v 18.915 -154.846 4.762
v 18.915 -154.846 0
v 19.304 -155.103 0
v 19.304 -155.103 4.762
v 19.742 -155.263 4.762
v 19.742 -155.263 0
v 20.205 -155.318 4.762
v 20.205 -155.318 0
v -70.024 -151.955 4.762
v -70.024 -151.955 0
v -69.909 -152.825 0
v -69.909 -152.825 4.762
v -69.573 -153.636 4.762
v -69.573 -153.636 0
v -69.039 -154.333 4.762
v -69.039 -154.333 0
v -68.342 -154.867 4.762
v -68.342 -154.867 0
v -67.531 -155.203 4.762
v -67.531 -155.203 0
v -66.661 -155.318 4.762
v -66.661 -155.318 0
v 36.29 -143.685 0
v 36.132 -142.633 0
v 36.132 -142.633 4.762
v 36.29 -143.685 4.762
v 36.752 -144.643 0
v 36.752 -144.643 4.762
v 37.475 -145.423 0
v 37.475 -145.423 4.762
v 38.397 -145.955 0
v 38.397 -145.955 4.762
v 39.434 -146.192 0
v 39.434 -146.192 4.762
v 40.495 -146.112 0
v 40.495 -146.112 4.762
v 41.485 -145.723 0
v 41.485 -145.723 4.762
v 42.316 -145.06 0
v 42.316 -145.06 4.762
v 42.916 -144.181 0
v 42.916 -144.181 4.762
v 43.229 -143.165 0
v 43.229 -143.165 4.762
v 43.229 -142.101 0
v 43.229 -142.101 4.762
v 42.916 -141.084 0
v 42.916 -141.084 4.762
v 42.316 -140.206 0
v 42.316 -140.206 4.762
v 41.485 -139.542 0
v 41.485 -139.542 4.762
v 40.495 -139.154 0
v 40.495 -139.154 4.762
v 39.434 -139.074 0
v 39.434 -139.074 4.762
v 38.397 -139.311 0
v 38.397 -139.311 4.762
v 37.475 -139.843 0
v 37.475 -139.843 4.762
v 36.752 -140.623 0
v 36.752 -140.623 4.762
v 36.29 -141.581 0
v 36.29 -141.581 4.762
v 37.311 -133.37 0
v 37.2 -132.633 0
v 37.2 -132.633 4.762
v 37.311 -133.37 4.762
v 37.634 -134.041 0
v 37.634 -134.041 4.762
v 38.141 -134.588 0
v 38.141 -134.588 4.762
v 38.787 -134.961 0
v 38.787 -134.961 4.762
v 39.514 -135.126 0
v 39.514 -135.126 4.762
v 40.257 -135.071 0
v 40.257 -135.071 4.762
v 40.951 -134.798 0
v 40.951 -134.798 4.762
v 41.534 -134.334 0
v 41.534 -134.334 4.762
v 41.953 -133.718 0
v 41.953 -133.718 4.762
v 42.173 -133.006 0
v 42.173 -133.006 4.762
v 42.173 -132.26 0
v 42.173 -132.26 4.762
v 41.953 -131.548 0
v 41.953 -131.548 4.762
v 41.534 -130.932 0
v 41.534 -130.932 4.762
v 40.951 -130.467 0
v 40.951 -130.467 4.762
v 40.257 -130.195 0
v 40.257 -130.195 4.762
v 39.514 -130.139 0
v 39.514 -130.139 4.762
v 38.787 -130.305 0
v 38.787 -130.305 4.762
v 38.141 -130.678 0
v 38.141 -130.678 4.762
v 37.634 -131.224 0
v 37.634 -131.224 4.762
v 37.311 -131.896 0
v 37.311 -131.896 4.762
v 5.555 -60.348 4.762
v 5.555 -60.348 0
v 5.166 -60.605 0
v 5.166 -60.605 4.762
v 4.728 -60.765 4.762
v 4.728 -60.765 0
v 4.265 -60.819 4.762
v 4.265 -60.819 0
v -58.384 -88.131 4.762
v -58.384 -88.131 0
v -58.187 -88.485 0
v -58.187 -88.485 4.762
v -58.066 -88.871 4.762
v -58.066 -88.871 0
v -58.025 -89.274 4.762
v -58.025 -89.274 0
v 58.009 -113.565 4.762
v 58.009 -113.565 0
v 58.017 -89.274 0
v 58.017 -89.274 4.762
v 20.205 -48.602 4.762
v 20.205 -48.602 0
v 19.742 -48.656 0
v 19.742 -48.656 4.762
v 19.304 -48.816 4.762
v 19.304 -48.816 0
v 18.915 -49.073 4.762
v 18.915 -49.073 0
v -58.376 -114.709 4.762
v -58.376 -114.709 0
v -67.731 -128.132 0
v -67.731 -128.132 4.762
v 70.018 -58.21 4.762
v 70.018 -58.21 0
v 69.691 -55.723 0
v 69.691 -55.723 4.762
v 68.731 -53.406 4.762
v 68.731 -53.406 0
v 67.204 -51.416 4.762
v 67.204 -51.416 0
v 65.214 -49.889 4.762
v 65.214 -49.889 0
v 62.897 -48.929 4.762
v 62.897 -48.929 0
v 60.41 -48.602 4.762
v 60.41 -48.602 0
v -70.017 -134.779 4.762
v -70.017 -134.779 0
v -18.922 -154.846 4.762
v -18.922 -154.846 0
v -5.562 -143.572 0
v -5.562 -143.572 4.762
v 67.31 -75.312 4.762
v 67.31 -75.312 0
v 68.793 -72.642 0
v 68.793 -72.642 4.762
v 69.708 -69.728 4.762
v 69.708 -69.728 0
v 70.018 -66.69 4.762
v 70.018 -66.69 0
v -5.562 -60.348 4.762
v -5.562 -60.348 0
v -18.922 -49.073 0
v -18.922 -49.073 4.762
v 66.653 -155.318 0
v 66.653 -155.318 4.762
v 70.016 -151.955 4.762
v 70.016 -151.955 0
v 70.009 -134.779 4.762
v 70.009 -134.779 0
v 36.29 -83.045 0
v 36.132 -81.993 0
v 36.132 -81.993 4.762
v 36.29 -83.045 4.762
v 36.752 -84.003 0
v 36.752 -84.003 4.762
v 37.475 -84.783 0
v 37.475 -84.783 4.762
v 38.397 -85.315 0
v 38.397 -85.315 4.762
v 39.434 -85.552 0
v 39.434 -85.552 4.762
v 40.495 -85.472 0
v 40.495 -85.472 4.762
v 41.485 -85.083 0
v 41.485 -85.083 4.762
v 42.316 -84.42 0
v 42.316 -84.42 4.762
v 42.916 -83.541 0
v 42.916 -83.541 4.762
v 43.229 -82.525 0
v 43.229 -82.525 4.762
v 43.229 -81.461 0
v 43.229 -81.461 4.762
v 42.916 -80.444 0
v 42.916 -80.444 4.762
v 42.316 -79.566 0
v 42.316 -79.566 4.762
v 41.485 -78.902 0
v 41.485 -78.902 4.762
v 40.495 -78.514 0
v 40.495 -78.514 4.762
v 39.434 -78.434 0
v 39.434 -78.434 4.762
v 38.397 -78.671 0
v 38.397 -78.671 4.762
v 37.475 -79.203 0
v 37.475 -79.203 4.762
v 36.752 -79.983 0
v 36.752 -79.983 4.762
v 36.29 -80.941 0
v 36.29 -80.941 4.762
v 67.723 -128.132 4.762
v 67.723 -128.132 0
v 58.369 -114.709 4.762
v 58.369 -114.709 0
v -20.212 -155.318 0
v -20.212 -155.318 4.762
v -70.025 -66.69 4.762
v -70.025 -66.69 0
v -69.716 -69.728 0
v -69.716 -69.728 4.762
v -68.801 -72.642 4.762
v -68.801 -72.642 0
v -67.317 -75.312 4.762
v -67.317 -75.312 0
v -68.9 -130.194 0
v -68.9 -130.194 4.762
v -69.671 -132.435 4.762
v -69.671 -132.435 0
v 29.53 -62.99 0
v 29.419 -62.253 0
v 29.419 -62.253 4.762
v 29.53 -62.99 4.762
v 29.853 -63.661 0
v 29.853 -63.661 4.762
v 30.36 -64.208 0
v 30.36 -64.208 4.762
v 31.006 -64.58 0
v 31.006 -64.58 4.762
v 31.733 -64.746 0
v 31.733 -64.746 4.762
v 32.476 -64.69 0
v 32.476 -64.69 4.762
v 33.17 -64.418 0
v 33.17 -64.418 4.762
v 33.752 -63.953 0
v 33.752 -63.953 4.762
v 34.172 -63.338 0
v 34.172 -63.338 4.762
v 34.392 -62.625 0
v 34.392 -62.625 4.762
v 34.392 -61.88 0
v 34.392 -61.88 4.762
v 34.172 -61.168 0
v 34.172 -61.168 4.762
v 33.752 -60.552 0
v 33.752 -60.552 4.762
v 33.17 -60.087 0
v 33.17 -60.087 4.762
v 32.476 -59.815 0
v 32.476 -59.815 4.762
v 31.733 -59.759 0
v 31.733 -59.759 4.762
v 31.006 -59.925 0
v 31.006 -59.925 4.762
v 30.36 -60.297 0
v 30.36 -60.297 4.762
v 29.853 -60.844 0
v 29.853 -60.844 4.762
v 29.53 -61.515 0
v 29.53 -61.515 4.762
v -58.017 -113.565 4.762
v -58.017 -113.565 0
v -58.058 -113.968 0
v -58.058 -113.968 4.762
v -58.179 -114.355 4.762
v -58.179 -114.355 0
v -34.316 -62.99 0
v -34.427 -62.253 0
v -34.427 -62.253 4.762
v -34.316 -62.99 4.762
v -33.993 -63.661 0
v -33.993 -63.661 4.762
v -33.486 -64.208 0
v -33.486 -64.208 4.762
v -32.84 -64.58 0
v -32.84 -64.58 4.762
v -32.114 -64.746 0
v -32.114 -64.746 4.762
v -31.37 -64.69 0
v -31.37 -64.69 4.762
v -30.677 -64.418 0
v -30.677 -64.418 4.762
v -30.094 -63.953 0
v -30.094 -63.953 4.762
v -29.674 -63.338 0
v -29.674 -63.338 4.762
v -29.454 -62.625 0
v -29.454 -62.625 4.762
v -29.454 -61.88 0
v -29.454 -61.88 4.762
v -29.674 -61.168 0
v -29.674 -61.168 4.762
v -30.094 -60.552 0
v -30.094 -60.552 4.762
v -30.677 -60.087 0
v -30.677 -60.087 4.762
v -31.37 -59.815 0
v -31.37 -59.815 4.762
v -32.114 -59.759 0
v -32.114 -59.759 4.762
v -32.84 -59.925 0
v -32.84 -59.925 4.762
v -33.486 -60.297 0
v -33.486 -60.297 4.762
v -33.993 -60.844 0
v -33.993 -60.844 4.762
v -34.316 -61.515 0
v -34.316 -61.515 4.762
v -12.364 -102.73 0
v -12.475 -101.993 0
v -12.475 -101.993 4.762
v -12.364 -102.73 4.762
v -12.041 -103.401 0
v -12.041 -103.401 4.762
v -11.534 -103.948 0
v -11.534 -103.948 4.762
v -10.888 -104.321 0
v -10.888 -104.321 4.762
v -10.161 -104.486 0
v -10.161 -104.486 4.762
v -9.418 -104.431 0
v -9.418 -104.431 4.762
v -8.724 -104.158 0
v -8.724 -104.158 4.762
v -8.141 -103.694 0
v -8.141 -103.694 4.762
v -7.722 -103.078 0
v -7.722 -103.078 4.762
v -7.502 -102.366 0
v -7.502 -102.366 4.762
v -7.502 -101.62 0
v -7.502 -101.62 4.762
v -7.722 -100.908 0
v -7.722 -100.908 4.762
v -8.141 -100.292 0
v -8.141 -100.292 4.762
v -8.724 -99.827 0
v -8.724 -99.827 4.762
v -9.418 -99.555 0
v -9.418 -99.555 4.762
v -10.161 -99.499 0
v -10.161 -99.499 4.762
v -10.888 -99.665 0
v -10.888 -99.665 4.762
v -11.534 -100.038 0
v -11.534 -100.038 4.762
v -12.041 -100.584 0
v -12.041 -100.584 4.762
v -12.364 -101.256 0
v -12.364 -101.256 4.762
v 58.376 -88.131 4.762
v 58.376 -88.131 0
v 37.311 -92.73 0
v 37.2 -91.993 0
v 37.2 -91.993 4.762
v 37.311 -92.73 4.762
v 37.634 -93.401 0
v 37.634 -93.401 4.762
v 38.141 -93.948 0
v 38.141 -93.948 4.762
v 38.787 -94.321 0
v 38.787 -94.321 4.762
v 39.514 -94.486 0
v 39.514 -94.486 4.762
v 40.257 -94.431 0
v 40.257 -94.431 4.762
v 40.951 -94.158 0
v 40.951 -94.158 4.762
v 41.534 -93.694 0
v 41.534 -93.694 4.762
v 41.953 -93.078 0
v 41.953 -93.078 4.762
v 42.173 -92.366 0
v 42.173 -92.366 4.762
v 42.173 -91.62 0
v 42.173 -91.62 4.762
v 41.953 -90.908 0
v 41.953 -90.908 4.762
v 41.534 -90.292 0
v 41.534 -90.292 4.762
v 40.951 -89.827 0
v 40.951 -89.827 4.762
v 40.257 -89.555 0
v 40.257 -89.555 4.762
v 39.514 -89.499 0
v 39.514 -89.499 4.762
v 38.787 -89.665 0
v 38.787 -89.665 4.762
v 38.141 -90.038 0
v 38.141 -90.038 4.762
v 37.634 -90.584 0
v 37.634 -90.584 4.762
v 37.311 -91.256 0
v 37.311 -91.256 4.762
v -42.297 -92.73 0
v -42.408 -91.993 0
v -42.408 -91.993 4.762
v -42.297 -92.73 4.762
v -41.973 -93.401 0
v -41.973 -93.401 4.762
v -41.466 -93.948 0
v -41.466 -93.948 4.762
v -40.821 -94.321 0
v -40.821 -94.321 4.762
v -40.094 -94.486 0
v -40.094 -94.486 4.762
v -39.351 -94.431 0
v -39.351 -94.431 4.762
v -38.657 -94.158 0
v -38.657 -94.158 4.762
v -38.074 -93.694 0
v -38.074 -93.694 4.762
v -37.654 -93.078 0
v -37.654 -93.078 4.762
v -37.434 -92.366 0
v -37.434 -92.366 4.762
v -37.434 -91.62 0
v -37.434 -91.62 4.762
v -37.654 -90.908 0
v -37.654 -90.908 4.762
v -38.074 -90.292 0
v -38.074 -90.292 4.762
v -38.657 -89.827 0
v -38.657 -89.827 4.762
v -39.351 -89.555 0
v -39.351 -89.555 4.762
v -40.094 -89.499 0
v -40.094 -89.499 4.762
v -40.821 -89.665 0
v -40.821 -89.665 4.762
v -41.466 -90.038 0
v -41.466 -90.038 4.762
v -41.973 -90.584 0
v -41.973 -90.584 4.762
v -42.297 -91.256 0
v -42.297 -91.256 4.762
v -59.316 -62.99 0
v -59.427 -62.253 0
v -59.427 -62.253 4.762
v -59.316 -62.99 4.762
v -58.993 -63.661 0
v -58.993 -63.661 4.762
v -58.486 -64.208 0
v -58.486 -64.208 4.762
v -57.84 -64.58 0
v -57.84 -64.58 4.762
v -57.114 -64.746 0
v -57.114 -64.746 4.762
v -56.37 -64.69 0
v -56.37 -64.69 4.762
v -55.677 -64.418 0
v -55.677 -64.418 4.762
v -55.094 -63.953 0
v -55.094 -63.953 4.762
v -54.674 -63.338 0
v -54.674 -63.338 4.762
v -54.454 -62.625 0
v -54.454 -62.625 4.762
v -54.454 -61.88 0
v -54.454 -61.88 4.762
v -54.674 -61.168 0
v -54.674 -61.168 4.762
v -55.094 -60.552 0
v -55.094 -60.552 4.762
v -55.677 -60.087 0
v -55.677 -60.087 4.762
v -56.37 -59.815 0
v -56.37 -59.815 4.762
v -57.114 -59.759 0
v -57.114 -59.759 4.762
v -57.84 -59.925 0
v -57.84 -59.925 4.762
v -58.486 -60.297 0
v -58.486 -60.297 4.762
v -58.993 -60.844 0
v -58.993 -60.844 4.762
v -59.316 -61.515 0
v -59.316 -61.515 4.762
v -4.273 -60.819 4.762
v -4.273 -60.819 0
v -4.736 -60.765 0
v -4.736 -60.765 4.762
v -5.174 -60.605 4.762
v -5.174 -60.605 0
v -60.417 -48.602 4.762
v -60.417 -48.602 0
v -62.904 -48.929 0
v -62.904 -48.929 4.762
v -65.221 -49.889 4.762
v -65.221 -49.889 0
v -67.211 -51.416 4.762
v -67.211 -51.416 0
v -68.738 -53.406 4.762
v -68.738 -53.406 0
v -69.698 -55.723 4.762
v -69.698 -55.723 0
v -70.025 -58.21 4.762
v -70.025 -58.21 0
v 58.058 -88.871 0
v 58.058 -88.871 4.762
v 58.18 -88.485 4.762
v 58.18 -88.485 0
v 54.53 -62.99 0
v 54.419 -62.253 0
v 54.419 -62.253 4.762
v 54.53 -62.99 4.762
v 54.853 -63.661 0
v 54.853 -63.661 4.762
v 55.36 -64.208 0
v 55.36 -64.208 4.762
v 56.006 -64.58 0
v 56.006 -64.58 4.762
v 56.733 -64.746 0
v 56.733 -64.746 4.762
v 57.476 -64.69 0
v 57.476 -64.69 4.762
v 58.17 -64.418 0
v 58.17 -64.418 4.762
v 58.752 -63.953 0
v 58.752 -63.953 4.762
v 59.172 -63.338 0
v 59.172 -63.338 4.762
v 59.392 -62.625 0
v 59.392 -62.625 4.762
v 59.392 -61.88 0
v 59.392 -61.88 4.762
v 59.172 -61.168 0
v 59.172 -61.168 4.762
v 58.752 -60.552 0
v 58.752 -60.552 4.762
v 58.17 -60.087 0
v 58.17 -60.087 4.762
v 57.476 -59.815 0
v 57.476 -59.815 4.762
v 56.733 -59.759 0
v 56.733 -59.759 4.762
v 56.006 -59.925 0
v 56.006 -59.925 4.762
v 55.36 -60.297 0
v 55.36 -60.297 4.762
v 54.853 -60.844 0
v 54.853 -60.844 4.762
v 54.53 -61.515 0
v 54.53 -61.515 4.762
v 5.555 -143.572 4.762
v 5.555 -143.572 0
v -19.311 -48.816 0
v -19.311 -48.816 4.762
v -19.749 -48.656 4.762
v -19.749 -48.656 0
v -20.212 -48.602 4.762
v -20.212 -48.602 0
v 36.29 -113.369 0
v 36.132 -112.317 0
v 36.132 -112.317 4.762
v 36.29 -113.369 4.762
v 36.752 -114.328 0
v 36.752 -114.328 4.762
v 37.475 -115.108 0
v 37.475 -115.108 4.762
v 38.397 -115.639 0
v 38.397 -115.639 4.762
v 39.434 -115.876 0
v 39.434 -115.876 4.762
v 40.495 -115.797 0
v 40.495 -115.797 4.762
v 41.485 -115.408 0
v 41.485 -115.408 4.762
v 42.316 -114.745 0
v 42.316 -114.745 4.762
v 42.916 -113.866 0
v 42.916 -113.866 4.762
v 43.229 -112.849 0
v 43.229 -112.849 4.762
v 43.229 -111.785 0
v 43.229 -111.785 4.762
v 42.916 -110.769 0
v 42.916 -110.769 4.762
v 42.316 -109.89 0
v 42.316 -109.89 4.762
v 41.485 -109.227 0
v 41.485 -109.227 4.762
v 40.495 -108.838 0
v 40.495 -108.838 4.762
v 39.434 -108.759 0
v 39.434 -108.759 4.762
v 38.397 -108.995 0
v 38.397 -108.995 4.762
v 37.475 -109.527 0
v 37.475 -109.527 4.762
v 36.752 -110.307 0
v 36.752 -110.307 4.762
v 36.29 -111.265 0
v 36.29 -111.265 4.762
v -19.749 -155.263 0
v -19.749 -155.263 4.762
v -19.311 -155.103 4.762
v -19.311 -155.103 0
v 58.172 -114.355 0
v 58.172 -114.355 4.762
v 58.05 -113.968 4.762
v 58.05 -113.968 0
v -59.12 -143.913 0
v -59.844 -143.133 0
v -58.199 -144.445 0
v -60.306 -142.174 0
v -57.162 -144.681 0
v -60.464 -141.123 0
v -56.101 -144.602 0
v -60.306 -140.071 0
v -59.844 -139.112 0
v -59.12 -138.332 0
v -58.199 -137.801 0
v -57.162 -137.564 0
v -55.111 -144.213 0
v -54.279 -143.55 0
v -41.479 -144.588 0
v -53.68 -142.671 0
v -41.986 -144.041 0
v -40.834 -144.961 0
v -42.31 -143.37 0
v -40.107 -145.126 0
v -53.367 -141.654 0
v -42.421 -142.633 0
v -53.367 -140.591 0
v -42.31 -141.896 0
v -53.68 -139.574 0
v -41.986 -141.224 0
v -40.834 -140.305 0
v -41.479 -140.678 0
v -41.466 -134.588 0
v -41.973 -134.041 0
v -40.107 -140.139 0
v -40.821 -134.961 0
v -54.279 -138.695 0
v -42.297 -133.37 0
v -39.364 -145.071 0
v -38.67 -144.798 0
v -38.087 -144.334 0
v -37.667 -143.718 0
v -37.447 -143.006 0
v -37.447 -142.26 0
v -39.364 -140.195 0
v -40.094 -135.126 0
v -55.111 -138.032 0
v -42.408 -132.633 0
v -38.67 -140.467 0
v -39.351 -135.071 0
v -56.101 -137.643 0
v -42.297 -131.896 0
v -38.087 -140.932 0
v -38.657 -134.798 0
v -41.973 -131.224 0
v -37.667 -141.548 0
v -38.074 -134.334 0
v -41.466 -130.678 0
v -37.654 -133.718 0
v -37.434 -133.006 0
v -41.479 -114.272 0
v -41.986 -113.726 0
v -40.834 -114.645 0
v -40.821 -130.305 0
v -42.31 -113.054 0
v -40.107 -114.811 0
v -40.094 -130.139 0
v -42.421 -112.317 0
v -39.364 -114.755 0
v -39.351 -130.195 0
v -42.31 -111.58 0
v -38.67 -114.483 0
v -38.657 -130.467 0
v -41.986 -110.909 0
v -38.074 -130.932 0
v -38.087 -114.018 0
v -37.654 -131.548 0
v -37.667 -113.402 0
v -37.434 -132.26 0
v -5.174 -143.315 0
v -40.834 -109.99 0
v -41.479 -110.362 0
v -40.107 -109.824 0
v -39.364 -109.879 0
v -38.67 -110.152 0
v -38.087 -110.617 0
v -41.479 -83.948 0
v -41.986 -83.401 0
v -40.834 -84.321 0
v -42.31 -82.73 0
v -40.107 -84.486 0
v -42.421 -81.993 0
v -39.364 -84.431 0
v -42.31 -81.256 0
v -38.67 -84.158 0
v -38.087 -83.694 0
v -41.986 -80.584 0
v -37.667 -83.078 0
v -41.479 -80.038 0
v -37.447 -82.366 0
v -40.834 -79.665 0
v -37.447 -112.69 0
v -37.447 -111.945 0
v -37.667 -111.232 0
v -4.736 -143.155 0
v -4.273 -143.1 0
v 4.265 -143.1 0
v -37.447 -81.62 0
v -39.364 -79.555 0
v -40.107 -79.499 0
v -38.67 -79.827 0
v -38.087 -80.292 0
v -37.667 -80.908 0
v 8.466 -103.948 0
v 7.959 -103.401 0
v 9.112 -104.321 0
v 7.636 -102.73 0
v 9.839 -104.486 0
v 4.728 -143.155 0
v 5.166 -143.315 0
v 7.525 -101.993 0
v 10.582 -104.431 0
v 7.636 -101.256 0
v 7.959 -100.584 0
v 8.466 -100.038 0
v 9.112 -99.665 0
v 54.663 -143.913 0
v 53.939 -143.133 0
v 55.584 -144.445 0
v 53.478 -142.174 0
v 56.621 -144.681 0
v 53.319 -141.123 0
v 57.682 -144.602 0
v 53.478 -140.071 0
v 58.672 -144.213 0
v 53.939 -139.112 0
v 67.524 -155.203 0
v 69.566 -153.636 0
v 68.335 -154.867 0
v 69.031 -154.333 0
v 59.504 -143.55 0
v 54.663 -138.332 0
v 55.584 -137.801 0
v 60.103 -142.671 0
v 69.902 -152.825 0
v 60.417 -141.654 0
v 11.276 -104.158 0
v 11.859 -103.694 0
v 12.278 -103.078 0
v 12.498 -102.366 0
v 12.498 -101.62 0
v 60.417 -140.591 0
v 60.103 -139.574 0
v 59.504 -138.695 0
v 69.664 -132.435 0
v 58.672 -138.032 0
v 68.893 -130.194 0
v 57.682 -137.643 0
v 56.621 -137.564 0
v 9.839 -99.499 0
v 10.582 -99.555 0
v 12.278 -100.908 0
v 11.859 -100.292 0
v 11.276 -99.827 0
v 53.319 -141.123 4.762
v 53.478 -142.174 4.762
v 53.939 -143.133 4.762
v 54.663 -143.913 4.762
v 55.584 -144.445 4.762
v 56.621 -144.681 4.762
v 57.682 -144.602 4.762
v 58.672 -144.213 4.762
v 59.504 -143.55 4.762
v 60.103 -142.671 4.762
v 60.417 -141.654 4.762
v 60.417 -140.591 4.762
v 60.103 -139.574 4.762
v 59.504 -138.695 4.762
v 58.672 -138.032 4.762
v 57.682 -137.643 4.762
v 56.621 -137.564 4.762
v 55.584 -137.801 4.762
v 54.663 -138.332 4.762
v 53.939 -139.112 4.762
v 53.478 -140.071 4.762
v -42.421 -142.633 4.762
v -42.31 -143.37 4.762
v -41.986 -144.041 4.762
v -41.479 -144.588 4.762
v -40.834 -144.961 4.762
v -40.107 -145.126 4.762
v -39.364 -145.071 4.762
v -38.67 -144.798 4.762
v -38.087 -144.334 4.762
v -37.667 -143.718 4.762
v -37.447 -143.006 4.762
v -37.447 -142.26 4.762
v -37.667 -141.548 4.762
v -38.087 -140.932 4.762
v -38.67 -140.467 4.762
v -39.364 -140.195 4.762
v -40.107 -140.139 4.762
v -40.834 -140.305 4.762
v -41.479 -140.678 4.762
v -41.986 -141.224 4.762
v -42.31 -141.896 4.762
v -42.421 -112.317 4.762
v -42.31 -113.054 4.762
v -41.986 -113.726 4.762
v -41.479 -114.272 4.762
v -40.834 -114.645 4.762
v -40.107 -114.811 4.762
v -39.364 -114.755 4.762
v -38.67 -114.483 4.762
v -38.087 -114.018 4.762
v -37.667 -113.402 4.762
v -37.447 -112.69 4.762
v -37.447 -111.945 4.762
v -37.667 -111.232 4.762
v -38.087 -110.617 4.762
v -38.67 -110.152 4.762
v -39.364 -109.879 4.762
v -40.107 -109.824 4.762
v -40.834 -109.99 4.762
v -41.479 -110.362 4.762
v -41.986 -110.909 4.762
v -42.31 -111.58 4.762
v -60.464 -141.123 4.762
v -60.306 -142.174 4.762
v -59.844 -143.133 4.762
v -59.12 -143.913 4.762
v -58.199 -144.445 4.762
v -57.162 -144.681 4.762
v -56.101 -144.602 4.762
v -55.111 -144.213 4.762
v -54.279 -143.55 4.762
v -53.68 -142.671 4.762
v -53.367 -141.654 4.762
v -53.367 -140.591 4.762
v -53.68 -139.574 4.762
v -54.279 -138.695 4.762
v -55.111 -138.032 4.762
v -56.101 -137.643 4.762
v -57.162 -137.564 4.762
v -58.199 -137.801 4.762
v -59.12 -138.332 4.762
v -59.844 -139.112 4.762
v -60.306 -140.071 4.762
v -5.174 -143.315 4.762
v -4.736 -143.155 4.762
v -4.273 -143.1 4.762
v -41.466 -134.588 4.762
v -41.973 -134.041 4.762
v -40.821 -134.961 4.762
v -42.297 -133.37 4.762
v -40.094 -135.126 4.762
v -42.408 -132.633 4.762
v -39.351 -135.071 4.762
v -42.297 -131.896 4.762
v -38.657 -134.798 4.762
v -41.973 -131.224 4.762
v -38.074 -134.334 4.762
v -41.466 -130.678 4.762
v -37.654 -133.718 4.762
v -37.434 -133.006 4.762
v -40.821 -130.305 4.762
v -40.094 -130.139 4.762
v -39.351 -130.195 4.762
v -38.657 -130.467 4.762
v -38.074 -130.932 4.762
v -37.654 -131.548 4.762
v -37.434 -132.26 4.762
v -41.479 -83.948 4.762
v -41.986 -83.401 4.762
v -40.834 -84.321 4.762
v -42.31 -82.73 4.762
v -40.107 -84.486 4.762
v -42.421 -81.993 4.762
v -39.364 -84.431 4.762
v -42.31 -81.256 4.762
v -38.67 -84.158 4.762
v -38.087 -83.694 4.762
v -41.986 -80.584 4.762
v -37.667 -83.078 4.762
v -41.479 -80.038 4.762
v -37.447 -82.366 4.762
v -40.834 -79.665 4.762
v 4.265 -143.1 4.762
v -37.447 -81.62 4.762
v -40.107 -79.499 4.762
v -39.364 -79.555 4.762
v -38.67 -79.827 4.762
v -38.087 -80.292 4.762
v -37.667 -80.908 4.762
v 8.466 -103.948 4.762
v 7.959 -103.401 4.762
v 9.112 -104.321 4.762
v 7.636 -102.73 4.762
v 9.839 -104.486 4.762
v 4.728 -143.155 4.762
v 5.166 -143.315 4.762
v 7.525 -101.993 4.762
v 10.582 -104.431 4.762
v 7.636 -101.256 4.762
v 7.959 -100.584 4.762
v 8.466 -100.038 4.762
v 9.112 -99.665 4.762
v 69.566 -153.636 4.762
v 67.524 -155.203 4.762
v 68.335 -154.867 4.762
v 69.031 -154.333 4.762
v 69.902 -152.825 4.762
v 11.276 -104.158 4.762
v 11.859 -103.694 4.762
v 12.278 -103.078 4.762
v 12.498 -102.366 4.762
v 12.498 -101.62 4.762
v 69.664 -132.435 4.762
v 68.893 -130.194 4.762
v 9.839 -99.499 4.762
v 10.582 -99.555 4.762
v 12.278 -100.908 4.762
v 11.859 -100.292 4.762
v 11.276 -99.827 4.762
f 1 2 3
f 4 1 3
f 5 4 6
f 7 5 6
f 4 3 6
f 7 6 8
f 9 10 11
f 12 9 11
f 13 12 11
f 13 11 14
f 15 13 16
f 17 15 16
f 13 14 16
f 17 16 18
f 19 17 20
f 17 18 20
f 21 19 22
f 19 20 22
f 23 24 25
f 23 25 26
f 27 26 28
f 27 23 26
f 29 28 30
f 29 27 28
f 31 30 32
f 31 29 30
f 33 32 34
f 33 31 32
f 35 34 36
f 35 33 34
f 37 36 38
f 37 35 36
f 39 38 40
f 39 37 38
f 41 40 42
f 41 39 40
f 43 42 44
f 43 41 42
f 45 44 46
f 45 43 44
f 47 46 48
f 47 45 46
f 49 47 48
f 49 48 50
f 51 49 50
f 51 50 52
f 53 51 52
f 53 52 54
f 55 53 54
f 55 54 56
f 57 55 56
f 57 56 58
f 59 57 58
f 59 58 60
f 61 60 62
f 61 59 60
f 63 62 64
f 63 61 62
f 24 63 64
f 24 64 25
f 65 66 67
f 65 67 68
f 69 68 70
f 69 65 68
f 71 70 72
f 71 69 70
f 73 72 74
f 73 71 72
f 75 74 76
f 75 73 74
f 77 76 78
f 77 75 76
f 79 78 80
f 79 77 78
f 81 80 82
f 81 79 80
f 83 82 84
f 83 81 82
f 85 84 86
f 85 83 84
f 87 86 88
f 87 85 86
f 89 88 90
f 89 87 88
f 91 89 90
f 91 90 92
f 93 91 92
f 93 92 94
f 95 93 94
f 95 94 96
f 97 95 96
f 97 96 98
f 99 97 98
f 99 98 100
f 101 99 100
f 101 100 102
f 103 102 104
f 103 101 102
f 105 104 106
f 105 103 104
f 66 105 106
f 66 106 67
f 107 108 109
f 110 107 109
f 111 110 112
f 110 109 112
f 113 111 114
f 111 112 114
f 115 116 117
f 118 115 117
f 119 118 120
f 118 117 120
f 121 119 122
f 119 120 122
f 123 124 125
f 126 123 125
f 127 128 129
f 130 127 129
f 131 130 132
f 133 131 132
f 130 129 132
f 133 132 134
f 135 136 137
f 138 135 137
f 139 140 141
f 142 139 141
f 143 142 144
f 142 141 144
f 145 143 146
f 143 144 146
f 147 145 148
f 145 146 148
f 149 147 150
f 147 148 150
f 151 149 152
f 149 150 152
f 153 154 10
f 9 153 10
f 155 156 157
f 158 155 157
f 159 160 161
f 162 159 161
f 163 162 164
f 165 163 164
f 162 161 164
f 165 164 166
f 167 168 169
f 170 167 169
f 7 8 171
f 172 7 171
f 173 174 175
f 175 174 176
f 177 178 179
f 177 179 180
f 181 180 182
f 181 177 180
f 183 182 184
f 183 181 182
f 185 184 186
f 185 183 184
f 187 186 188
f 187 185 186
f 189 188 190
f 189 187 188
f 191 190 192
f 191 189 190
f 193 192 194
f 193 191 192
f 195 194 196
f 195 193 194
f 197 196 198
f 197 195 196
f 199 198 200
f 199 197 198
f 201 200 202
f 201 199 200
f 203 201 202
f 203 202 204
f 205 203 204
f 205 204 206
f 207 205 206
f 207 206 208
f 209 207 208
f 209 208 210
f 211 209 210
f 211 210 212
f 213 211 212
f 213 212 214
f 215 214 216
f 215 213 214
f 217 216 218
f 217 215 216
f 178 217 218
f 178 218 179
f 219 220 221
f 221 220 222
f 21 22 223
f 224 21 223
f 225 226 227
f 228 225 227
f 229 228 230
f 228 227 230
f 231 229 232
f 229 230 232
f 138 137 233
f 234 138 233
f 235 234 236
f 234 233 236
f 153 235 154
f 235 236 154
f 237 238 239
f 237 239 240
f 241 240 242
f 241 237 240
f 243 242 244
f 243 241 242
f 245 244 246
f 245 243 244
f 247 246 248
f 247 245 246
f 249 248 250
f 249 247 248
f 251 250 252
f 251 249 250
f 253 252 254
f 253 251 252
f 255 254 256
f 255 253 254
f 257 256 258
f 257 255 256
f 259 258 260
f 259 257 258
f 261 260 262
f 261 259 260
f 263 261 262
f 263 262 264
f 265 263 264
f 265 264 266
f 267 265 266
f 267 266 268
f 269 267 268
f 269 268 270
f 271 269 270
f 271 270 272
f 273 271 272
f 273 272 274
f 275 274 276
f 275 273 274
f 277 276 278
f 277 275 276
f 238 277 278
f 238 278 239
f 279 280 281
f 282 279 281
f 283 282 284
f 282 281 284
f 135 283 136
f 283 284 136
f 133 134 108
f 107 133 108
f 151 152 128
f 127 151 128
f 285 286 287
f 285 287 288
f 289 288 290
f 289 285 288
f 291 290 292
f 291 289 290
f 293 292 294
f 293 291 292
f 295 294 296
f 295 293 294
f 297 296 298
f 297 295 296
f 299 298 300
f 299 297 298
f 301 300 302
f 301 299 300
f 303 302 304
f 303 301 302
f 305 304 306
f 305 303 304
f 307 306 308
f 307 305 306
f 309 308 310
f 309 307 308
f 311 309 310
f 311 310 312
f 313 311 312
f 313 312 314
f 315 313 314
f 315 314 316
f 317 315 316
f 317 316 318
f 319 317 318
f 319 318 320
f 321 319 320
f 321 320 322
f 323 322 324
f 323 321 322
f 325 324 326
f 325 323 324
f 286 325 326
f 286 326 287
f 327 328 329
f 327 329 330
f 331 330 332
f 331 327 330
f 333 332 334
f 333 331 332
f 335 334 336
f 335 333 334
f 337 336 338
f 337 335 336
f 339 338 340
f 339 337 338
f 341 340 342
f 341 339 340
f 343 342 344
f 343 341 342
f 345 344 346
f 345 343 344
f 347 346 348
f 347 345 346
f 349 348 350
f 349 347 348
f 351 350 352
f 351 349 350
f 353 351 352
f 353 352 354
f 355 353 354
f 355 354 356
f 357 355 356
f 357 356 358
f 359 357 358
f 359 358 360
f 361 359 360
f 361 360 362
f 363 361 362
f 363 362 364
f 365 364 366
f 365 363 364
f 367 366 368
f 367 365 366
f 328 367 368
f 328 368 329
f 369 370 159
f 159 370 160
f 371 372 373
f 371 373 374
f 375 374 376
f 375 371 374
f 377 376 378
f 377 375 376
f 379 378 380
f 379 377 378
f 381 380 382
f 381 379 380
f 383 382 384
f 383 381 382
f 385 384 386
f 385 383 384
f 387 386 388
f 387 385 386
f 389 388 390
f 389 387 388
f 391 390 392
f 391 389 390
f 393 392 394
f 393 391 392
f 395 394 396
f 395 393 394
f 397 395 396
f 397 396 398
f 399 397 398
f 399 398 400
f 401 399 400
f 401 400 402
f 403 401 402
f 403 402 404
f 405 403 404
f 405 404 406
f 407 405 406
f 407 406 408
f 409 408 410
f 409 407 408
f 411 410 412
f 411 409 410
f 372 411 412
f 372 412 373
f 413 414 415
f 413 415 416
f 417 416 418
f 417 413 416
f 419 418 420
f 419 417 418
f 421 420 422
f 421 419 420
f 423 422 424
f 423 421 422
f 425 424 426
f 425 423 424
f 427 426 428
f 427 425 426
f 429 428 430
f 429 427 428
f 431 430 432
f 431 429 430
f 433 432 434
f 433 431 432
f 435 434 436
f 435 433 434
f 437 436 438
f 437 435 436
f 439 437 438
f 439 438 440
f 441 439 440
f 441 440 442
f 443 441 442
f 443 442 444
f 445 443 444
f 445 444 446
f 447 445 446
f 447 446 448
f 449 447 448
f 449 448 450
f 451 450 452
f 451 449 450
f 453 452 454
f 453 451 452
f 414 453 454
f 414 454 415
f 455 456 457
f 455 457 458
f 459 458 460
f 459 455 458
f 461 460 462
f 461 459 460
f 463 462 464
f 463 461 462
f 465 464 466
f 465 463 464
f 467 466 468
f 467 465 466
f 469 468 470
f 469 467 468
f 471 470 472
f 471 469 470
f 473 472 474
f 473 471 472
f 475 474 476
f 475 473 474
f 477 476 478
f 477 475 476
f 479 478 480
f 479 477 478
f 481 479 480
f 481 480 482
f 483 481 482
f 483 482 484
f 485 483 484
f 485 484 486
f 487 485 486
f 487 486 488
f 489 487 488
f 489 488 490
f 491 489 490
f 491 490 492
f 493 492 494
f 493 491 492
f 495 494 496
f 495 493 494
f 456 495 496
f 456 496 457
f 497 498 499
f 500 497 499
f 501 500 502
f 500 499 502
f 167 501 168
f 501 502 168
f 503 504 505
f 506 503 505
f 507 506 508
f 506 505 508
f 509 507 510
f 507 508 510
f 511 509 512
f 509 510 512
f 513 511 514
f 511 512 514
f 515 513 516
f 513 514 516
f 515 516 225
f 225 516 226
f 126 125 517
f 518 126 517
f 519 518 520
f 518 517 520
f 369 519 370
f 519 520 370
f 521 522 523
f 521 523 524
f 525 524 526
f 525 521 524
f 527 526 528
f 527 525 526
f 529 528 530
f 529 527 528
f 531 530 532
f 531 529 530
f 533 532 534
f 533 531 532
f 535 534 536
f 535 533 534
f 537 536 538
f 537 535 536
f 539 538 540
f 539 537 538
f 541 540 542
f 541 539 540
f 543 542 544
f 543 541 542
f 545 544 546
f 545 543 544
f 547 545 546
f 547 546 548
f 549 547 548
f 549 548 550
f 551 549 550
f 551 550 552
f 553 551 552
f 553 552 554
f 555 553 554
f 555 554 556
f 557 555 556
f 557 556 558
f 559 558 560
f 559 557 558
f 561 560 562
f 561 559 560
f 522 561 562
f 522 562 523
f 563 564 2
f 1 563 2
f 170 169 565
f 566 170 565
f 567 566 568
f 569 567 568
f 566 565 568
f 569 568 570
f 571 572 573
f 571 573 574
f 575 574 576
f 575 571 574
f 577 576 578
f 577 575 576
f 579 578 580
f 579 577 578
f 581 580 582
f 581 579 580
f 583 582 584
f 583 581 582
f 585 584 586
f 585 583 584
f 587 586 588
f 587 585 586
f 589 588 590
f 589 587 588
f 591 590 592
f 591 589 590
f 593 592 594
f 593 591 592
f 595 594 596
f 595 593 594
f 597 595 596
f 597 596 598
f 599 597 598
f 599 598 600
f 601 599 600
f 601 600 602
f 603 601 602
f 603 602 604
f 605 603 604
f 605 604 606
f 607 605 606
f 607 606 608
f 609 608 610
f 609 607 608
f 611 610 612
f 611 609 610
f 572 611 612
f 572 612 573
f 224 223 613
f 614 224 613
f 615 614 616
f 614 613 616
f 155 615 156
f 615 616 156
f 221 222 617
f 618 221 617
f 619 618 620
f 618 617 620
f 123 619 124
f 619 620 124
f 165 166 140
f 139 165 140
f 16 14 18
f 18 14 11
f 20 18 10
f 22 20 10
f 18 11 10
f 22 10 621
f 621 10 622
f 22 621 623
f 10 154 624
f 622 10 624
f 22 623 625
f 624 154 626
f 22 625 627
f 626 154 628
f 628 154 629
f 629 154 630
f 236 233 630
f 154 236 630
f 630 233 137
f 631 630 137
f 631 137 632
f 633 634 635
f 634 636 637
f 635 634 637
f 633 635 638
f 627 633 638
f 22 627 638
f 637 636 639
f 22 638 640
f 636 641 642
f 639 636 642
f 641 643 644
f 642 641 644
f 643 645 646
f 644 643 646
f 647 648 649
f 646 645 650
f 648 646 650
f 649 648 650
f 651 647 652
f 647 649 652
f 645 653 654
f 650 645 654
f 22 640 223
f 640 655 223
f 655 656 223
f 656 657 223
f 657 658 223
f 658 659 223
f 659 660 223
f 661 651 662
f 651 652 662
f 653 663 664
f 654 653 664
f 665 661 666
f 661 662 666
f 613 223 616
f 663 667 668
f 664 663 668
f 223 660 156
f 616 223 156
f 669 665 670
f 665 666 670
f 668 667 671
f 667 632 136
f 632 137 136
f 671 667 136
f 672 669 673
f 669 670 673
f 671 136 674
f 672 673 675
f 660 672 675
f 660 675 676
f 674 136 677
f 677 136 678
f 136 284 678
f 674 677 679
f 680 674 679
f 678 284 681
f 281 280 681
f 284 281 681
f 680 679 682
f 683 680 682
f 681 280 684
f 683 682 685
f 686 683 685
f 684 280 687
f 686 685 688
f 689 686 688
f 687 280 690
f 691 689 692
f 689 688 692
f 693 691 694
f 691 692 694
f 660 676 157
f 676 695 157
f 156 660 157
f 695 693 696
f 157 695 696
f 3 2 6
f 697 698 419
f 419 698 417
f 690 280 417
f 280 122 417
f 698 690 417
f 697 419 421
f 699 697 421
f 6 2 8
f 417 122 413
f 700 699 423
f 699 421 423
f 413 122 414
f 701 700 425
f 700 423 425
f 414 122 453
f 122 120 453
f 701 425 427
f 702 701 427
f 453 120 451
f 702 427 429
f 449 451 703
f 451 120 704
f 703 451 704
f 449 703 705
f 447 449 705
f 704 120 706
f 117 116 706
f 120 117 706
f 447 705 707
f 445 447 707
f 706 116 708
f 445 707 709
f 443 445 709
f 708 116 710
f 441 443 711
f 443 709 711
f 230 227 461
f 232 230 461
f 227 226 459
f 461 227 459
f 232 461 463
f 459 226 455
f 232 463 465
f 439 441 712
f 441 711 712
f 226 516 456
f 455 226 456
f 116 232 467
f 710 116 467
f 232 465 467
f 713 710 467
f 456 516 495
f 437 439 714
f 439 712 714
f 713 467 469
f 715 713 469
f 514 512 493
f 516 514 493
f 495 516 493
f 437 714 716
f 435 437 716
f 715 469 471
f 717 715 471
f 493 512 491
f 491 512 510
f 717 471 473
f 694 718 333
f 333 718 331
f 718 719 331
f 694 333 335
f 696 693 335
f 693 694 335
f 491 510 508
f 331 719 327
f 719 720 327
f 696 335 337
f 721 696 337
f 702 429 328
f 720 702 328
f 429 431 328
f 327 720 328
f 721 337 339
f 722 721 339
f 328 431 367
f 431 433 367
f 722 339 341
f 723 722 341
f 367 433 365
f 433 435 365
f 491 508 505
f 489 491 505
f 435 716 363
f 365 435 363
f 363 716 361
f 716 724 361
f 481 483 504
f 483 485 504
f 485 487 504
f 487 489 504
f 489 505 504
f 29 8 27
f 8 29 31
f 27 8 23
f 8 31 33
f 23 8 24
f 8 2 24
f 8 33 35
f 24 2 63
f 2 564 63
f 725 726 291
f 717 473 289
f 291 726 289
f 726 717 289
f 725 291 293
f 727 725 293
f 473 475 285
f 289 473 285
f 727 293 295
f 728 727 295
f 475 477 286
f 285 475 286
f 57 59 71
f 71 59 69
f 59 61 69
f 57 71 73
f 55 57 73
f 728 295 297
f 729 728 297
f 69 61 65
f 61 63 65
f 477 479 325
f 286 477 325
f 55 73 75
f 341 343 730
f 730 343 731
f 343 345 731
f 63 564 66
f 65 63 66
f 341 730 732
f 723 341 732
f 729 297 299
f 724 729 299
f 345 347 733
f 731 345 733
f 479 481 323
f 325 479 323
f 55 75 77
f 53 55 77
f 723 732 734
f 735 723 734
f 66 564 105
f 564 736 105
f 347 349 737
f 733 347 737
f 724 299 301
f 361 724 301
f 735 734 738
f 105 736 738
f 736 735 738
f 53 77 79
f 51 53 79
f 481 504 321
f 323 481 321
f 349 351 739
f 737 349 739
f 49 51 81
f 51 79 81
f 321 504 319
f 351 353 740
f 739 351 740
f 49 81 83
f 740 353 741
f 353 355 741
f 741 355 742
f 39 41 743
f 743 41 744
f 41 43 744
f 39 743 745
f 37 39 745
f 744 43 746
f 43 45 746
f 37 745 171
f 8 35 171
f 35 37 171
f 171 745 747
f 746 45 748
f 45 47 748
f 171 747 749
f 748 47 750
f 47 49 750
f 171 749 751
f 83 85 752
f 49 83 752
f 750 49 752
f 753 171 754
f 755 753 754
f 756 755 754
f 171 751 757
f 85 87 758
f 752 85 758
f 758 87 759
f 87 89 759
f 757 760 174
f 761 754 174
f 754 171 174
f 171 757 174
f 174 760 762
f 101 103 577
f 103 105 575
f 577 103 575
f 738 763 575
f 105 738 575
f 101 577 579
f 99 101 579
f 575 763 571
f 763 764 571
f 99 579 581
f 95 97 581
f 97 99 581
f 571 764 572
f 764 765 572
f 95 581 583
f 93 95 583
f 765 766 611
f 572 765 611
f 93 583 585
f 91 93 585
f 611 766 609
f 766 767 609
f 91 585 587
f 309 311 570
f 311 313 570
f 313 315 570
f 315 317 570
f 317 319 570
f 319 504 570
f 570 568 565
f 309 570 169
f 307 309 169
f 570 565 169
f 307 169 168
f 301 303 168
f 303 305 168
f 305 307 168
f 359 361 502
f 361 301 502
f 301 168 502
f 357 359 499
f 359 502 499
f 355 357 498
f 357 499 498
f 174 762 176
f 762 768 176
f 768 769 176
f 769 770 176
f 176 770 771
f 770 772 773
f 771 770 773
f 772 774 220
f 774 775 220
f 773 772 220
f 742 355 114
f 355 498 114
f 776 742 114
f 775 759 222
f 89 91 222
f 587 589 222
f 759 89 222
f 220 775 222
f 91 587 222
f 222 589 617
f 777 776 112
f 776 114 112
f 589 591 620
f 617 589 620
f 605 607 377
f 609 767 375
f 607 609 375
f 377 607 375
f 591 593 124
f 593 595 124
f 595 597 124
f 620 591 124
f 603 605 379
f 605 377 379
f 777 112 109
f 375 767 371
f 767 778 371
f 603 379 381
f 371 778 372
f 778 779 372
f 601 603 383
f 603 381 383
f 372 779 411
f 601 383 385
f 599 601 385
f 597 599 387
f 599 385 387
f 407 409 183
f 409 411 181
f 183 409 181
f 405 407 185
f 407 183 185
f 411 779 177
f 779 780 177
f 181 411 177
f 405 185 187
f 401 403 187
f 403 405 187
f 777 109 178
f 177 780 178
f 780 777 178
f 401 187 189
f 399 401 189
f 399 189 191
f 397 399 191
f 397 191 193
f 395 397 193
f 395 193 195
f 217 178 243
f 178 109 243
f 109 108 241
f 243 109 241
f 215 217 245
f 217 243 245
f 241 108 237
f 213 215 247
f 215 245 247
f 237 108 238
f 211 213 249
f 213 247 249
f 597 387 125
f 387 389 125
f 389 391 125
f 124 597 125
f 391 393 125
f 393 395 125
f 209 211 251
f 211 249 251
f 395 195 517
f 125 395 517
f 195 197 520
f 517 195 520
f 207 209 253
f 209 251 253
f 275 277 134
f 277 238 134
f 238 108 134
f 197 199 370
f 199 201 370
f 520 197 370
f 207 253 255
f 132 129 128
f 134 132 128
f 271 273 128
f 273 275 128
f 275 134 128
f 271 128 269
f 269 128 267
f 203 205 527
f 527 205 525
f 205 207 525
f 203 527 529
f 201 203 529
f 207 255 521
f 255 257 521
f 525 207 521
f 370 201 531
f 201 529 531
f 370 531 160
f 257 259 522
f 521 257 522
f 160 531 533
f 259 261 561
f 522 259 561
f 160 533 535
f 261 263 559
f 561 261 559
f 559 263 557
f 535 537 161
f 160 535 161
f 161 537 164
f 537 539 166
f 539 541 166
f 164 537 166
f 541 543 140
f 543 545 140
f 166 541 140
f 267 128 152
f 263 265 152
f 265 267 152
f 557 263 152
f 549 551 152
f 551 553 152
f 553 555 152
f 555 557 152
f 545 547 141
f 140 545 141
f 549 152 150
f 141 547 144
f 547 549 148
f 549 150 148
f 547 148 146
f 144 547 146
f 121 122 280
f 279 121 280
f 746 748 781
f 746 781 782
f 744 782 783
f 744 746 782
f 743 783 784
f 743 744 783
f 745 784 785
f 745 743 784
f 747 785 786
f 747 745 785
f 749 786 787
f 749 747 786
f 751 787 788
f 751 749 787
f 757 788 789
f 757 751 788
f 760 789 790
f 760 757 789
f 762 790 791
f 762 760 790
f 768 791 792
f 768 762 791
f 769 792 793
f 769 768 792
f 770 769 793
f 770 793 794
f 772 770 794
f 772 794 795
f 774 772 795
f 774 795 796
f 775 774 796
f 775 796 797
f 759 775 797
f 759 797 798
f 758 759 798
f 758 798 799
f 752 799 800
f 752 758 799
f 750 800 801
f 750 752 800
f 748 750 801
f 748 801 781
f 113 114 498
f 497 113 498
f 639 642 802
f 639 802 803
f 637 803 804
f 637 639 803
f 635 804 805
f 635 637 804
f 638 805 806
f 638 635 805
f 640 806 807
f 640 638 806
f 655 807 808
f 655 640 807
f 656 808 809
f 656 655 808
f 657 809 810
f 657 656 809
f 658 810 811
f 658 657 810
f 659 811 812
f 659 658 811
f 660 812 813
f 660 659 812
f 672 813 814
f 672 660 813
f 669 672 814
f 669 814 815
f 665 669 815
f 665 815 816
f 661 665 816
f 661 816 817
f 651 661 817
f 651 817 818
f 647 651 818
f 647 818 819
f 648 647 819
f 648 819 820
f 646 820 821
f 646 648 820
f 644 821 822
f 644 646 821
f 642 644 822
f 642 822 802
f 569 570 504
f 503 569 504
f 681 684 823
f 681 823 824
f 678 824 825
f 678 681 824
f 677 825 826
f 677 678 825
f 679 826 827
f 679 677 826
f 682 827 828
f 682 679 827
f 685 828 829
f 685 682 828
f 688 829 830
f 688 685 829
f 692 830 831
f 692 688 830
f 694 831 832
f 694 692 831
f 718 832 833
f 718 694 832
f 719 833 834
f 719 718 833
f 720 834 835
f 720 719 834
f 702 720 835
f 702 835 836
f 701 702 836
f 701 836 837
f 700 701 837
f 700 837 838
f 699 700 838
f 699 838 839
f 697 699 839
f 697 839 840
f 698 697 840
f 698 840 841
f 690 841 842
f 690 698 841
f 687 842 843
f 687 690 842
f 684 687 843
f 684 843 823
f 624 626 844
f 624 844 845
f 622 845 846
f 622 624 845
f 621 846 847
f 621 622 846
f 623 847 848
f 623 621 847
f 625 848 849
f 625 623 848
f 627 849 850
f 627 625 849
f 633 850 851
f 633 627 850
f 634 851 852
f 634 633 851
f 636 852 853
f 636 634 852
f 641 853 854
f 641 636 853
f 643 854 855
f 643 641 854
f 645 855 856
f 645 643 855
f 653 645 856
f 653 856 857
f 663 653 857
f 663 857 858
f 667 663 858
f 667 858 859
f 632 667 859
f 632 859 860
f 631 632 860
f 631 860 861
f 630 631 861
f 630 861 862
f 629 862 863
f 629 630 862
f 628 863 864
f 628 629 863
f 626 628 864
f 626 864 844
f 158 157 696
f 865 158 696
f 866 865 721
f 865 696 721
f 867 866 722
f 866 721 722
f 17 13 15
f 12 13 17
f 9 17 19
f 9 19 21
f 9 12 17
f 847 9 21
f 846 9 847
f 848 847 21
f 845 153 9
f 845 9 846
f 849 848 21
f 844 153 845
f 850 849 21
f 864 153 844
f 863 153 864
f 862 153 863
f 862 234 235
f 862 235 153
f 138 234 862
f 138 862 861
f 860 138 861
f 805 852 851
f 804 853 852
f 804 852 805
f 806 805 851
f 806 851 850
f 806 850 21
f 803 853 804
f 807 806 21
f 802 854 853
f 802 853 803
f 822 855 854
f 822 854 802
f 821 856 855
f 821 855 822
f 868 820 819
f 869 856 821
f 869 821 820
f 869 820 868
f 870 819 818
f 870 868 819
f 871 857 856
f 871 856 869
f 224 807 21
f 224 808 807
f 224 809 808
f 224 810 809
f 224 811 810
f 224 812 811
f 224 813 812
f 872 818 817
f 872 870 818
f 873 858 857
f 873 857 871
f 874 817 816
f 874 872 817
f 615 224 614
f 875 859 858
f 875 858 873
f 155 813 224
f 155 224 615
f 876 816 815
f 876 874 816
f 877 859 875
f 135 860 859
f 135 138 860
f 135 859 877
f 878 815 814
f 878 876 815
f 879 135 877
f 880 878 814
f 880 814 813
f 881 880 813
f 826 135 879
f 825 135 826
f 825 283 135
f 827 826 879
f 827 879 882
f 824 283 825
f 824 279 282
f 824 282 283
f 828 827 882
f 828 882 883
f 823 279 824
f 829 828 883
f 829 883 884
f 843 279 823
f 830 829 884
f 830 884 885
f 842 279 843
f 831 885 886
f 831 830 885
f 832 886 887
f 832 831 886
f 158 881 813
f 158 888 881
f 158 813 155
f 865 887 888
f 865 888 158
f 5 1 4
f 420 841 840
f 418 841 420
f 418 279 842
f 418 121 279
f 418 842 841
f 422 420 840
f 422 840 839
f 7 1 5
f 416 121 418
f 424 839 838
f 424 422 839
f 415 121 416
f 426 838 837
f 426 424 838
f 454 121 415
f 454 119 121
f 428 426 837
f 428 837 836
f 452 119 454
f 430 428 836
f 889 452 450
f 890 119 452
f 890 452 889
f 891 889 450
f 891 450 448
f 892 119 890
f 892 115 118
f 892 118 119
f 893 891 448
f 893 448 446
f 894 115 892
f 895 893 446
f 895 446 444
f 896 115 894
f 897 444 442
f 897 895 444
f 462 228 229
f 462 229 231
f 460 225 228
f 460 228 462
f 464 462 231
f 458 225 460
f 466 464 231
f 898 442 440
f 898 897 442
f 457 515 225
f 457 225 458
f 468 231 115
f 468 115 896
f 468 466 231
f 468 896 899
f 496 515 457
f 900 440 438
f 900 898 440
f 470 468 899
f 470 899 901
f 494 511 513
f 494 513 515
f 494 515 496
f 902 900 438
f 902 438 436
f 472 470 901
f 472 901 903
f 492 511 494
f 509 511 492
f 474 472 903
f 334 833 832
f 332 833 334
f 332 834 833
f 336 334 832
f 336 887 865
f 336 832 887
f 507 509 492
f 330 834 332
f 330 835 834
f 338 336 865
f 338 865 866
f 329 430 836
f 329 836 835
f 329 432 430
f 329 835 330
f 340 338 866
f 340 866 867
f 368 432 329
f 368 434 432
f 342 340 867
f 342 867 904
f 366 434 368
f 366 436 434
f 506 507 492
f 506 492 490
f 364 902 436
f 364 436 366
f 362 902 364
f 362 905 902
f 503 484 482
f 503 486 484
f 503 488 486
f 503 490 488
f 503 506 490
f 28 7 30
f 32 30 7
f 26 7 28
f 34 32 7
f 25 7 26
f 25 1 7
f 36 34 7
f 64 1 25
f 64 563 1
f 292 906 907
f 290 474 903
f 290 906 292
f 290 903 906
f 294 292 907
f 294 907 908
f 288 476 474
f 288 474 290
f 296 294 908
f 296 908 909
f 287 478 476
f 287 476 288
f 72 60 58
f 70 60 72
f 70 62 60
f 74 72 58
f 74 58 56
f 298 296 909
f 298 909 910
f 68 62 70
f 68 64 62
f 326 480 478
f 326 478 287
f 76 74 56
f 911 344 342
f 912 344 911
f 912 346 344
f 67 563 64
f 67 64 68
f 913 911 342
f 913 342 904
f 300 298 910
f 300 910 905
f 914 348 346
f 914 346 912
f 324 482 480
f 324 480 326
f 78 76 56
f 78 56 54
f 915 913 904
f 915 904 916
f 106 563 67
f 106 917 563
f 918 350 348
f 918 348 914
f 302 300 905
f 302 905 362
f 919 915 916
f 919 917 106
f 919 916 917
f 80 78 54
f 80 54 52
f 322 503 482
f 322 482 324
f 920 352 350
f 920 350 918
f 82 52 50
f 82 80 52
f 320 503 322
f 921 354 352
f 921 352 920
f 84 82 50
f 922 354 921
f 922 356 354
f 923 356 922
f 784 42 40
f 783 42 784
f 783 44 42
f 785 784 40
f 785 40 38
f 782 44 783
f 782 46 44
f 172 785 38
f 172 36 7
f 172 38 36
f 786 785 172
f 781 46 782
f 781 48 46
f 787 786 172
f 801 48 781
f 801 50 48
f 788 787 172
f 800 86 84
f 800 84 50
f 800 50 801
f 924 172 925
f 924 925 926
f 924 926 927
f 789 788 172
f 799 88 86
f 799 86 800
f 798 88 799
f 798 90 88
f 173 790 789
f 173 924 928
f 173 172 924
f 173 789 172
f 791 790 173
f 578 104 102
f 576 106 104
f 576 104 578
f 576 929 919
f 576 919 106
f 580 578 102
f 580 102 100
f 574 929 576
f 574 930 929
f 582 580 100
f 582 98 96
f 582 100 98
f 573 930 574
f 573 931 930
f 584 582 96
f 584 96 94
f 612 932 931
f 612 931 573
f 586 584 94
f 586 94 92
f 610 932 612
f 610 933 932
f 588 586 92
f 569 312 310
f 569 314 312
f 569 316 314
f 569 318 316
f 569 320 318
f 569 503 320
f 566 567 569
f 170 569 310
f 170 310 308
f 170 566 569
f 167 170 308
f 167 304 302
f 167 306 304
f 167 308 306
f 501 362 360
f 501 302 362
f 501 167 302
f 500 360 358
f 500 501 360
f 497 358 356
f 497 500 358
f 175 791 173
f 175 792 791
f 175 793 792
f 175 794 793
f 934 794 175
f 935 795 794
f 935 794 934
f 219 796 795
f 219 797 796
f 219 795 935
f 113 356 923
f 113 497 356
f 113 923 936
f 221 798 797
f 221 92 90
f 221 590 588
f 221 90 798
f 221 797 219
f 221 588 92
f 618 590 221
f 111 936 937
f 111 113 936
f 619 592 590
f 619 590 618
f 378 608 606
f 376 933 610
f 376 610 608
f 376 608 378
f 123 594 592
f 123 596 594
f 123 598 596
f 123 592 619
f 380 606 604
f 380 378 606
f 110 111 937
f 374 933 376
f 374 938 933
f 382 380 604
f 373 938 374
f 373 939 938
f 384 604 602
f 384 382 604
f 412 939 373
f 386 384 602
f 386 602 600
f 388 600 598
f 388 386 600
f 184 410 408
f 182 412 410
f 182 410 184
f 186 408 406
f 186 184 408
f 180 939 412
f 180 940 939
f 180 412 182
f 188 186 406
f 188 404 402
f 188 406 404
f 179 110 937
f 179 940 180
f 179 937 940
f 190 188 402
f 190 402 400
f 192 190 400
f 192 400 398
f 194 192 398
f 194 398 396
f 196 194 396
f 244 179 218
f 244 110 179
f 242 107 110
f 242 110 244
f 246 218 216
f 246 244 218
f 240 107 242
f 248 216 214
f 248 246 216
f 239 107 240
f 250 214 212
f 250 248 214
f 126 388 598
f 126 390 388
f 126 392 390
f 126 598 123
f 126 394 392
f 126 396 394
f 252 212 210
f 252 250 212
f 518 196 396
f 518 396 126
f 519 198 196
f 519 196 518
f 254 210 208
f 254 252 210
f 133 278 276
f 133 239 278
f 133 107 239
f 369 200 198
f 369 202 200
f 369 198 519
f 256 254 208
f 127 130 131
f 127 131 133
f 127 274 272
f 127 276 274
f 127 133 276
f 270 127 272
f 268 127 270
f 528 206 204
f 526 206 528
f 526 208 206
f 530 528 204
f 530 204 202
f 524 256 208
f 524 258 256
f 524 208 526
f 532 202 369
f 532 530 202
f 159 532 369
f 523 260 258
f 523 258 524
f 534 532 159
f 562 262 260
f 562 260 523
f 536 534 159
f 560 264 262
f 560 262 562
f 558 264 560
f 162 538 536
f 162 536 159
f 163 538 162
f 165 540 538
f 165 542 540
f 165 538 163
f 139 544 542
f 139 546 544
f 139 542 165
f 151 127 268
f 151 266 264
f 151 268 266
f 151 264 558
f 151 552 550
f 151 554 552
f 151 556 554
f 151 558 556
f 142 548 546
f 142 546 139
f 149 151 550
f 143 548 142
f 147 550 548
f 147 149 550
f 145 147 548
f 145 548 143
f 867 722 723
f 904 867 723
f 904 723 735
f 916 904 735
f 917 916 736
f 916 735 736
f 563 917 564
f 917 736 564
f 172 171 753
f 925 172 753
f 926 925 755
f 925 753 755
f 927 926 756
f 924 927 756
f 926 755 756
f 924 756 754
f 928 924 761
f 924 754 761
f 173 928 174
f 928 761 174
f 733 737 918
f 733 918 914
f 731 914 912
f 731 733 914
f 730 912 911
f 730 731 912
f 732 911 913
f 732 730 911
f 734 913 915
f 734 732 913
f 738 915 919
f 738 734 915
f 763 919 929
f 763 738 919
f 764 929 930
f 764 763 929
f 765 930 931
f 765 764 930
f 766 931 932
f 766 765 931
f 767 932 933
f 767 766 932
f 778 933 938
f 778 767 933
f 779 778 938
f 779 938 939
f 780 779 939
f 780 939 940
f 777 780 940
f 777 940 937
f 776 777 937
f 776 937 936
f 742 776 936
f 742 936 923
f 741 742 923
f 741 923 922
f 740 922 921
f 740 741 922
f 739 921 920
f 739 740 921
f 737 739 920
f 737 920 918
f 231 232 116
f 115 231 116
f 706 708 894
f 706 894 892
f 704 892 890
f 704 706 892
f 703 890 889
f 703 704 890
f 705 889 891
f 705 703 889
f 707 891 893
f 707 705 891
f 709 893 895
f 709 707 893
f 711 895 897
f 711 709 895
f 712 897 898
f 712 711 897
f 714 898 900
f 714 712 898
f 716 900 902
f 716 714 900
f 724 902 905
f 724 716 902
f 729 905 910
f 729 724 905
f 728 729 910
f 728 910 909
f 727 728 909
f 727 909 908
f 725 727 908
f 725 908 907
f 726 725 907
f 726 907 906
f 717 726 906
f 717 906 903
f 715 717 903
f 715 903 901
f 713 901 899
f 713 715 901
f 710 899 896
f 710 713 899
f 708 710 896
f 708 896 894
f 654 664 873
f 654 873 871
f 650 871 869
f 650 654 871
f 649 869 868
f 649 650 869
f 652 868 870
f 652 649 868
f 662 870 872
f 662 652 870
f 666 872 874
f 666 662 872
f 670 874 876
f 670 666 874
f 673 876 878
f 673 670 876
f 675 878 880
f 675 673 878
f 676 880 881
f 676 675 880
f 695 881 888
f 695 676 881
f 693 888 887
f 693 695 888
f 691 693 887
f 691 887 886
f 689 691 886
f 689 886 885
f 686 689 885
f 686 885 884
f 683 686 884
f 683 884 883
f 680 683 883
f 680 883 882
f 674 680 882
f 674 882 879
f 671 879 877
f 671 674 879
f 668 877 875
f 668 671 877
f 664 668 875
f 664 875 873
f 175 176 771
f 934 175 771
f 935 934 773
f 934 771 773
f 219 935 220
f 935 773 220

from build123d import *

# Parameters (mm, degrees)
SKETCH2_R           = 2.50063
SKETCH2_R_2         = 3.5687
BOSS_EXTRUDE1_DEPTH = 4.7625


with BuildPart() as part:
    # Sketch2 → Boss-Extrude1 (new body)
    with BuildSketch(Plane.XY):
        with BuildLine():
            Line((20.204627806, -155.317842979), (66.653485088, -155.317842979))
            ThreePointArc((66.653485088, -155.317842979), (69.031331892, -154.332906584), (70.016268288, -151.95505978))
            Line((70.016268288, -151.95505978), (70.009462537, -134.779191139))
            ThreePointArc((70.009462537, -134.779191139), (69.330107736, -131.296239945), (67.723101309, -128.132381176))
            Line((67.723101309, -128.132381176), (58.368571144, -114.709141578))
            ThreePointArc((58.368571144, -114.709141578), (58.101227711, -114.164618042), (58.009428426, -113.56499209))
            Line((58.009428426, -113.56499209), (58.017340801, -89.273956224))
            ThreePointArc((58.017340801, -89.273956224), (58.109330305, -88.675027543), (58.376464494, -88.131136967))
            Line((58.376464494, -88.131136967), (67.309788153, -75.311850981))
            ThreePointArc((67.309788153, -75.311850981), (69.324850125, -71.208346949), (70.017816939, -66.689606297))
            Line((70.017816939, -66.689606297), (70.017970953, -58.209892985))
            ThreePointArc((70.017970953, -58.209892985), (67.203843889, -51.415989261), (60.409940165, -48.601862197))
            Line((60.409940165, -48.601862197), (20.204627806, -48.601862197))
            ThreePointArc((20.204627806, -48.601862197), (19.517944941, -48.72344088), (18.914748074, -49.073395554))
            Line((18.914748074, -49.073395554), (5.555020387, -60.347728592))
            ThreePointArc((5.555020387, -60.347728592), (4.951823521, -60.697683266), (4.265140655, -60.819261949))
            Line((4.265140655, -60.819261949), (-4.272604079, -60.819261949))
            ThreePointArc((-4.272604079, -60.819261949), (-4.959286944, -60.697683266), (-5.562483811, -60.347728592))
            Line((-5.562483811, -60.347728592), (-18.922211498, -49.073395554))
            ThreePointArc((-18.922211498, -49.073395554), (-19.525408364, -48.72344088), (-20.212091229, -48.601862197))
            Line((-20.212091229, -48.601862197), (-60.417403588, -48.601862197))
            ThreePointArc((-60.417403588, -48.601862197), (-67.211307313, -51.415989261), (-70.025434377, -58.209892985))
            Line((-70.025434377, -58.209892985), (-70.025280362, -66.689606297))
            ThreePointArc((-70.025280362, -66.689606297), (-69.332313549, -71.208346949), (-67.317251577, -75.311850981))
            Line((-67.317251577, -75.311850981), (-58.383927917, -88.131136967))
            ThreePointArc((-58.383927917, -88.131136967), (-58.116793729, -88.675027543), (-58.024804225, -89.273956224))
            Line((-58.024804225, -89.273956224), (-58.01689185, -113.56499209))
            ThreePointArc((-58.01689185, -113.56499209), (-58.108691135, -114.164618042), (-58.376034568, -114.709141578))
            Line((-58.376034568, -114.709141578), (-67.730564733, -128.132381176))
            ThreePointArc((-67.730564733, -128.132381176), (-69.337571159, -131.296239945), (-70.016925961, -134.779191139))
            Line((-70.016925961, -134.779191139), (-70.023731711, -151.95505978))
            ThreePointArc((-70.023731711, -151.95505978), (-69.038795316, -154.332906584), (-66.660948512, -155.317842979))
            Line((-66.660948512, -155.317842979), (-20.212091229, -155.317842979))
            ThreePointArc((-20.212091229, -155.317842979), (-19.525408364, -155.196264296), (-18.922211498, -154.846309622))
            Line((-18.922211498, -154.846309622), (-5.562483811, -143.571976584))
            ThreePointArc((-5.562483811, -143.571976584), (-4.959286944, -143.22202191), (-4.272604079, -143.100443227))
            Line((-4.272604079, -143.100443227), (4.265140655, -143.100443227))
            ThreePointArc((4.265140655, -143.100443227), (4.951823521, -143.22202191), (5.555020387, -143.571976584))
            Line((5.555020387, -143.571976584), (18.914748074, -154.846309622))
            ThreePointArc((18.914748074, -154.846309622), (19.517944941, -155.196264296), (20.204627806, -155.317842979))
        make_face()
        with Locations((-56.926856711, -62.252536918)):
            Circle(SKETCH2_R, mode=Mode.SUBTRACT)
        with Locations((-31.926856712, -62.252536918)):
            Circle(SKETCH2_R, mode=Mode.SUBTRACT)
        with Locations((31.919393288, -62.252536918)):
            Circle(SKETCH2_R, mode=Mode.SUBTRACT)
        with Locations((56.919393288, -62.252536918)):
            Circle(SKETCH2_R, mode=Mode.SUBTRACT)
        with Locations((-39.920054199, -81.992843779)):
            Circle(SKETCH2_R, mode=Mode.SUBTRACT)
        with Locations((-39.907032742, -91.992843779)):
            Circle(SKETCH2_R, mode=Mode.SUBTRACT)
        with Locations((-39.920054199, -112.317382635)):
            Circle(SKETCH2_R, mode=Mode.SUBTRACT)
        with Locations((-39.907032742, -132.632843676)):
            Circle(SKETCH2_R, mode=Mode.SUBTRACT)
        with Locations((-39.920054199, -142.632843676)):
            Circle(SKETCH2_R, mode=Mode.SUBTRACT)
        with Locations((10.02542097, -101.992843779)):
            Circle(SKETCH2_R, mode=Mode.SUBTRACT)
        with Locations((-9.97457903, -101.992843779)):
            Circle(SKETCH2_R, mode=Mode.SUBTRACT)
        with Locations((39.700429549, -91.992843779)):
            Circle(SKETCH2_R, mode=Mode.SUBTRACT)
        with Locations((39.700429549, -132.632843676)):
            Circle(SKETCH2_R, mode=Mode.SUBTRACT)
        with Locations((-56.895356292, -141.122536917)):
            Circle(SKETCH2_R_2, mode=Mode.SUBTRACT)
        with Locations((39.700429549, -142.632843676)):
            Circle(SKETCH2_R_2, mode=Mode.SUBTRACT)
        with Locations((39.700429549, -112.317382635)):
            Circle(SKETCH2_R_2, mode=Mode.SUBTRACT)
        with Locations((39.700429549, -81.992843779)):
            Circle(SKETCH2_R_2, mode=Mode.SUBTRACT)
        with Locations((56.887892868, -141.122536917)):
            Circle(SKETCH2_R_2, mode=Mode.SUBTRACT)
    extrude(amount=BOSS_EXTRUDE1_DEPTH)


solid = part.part
